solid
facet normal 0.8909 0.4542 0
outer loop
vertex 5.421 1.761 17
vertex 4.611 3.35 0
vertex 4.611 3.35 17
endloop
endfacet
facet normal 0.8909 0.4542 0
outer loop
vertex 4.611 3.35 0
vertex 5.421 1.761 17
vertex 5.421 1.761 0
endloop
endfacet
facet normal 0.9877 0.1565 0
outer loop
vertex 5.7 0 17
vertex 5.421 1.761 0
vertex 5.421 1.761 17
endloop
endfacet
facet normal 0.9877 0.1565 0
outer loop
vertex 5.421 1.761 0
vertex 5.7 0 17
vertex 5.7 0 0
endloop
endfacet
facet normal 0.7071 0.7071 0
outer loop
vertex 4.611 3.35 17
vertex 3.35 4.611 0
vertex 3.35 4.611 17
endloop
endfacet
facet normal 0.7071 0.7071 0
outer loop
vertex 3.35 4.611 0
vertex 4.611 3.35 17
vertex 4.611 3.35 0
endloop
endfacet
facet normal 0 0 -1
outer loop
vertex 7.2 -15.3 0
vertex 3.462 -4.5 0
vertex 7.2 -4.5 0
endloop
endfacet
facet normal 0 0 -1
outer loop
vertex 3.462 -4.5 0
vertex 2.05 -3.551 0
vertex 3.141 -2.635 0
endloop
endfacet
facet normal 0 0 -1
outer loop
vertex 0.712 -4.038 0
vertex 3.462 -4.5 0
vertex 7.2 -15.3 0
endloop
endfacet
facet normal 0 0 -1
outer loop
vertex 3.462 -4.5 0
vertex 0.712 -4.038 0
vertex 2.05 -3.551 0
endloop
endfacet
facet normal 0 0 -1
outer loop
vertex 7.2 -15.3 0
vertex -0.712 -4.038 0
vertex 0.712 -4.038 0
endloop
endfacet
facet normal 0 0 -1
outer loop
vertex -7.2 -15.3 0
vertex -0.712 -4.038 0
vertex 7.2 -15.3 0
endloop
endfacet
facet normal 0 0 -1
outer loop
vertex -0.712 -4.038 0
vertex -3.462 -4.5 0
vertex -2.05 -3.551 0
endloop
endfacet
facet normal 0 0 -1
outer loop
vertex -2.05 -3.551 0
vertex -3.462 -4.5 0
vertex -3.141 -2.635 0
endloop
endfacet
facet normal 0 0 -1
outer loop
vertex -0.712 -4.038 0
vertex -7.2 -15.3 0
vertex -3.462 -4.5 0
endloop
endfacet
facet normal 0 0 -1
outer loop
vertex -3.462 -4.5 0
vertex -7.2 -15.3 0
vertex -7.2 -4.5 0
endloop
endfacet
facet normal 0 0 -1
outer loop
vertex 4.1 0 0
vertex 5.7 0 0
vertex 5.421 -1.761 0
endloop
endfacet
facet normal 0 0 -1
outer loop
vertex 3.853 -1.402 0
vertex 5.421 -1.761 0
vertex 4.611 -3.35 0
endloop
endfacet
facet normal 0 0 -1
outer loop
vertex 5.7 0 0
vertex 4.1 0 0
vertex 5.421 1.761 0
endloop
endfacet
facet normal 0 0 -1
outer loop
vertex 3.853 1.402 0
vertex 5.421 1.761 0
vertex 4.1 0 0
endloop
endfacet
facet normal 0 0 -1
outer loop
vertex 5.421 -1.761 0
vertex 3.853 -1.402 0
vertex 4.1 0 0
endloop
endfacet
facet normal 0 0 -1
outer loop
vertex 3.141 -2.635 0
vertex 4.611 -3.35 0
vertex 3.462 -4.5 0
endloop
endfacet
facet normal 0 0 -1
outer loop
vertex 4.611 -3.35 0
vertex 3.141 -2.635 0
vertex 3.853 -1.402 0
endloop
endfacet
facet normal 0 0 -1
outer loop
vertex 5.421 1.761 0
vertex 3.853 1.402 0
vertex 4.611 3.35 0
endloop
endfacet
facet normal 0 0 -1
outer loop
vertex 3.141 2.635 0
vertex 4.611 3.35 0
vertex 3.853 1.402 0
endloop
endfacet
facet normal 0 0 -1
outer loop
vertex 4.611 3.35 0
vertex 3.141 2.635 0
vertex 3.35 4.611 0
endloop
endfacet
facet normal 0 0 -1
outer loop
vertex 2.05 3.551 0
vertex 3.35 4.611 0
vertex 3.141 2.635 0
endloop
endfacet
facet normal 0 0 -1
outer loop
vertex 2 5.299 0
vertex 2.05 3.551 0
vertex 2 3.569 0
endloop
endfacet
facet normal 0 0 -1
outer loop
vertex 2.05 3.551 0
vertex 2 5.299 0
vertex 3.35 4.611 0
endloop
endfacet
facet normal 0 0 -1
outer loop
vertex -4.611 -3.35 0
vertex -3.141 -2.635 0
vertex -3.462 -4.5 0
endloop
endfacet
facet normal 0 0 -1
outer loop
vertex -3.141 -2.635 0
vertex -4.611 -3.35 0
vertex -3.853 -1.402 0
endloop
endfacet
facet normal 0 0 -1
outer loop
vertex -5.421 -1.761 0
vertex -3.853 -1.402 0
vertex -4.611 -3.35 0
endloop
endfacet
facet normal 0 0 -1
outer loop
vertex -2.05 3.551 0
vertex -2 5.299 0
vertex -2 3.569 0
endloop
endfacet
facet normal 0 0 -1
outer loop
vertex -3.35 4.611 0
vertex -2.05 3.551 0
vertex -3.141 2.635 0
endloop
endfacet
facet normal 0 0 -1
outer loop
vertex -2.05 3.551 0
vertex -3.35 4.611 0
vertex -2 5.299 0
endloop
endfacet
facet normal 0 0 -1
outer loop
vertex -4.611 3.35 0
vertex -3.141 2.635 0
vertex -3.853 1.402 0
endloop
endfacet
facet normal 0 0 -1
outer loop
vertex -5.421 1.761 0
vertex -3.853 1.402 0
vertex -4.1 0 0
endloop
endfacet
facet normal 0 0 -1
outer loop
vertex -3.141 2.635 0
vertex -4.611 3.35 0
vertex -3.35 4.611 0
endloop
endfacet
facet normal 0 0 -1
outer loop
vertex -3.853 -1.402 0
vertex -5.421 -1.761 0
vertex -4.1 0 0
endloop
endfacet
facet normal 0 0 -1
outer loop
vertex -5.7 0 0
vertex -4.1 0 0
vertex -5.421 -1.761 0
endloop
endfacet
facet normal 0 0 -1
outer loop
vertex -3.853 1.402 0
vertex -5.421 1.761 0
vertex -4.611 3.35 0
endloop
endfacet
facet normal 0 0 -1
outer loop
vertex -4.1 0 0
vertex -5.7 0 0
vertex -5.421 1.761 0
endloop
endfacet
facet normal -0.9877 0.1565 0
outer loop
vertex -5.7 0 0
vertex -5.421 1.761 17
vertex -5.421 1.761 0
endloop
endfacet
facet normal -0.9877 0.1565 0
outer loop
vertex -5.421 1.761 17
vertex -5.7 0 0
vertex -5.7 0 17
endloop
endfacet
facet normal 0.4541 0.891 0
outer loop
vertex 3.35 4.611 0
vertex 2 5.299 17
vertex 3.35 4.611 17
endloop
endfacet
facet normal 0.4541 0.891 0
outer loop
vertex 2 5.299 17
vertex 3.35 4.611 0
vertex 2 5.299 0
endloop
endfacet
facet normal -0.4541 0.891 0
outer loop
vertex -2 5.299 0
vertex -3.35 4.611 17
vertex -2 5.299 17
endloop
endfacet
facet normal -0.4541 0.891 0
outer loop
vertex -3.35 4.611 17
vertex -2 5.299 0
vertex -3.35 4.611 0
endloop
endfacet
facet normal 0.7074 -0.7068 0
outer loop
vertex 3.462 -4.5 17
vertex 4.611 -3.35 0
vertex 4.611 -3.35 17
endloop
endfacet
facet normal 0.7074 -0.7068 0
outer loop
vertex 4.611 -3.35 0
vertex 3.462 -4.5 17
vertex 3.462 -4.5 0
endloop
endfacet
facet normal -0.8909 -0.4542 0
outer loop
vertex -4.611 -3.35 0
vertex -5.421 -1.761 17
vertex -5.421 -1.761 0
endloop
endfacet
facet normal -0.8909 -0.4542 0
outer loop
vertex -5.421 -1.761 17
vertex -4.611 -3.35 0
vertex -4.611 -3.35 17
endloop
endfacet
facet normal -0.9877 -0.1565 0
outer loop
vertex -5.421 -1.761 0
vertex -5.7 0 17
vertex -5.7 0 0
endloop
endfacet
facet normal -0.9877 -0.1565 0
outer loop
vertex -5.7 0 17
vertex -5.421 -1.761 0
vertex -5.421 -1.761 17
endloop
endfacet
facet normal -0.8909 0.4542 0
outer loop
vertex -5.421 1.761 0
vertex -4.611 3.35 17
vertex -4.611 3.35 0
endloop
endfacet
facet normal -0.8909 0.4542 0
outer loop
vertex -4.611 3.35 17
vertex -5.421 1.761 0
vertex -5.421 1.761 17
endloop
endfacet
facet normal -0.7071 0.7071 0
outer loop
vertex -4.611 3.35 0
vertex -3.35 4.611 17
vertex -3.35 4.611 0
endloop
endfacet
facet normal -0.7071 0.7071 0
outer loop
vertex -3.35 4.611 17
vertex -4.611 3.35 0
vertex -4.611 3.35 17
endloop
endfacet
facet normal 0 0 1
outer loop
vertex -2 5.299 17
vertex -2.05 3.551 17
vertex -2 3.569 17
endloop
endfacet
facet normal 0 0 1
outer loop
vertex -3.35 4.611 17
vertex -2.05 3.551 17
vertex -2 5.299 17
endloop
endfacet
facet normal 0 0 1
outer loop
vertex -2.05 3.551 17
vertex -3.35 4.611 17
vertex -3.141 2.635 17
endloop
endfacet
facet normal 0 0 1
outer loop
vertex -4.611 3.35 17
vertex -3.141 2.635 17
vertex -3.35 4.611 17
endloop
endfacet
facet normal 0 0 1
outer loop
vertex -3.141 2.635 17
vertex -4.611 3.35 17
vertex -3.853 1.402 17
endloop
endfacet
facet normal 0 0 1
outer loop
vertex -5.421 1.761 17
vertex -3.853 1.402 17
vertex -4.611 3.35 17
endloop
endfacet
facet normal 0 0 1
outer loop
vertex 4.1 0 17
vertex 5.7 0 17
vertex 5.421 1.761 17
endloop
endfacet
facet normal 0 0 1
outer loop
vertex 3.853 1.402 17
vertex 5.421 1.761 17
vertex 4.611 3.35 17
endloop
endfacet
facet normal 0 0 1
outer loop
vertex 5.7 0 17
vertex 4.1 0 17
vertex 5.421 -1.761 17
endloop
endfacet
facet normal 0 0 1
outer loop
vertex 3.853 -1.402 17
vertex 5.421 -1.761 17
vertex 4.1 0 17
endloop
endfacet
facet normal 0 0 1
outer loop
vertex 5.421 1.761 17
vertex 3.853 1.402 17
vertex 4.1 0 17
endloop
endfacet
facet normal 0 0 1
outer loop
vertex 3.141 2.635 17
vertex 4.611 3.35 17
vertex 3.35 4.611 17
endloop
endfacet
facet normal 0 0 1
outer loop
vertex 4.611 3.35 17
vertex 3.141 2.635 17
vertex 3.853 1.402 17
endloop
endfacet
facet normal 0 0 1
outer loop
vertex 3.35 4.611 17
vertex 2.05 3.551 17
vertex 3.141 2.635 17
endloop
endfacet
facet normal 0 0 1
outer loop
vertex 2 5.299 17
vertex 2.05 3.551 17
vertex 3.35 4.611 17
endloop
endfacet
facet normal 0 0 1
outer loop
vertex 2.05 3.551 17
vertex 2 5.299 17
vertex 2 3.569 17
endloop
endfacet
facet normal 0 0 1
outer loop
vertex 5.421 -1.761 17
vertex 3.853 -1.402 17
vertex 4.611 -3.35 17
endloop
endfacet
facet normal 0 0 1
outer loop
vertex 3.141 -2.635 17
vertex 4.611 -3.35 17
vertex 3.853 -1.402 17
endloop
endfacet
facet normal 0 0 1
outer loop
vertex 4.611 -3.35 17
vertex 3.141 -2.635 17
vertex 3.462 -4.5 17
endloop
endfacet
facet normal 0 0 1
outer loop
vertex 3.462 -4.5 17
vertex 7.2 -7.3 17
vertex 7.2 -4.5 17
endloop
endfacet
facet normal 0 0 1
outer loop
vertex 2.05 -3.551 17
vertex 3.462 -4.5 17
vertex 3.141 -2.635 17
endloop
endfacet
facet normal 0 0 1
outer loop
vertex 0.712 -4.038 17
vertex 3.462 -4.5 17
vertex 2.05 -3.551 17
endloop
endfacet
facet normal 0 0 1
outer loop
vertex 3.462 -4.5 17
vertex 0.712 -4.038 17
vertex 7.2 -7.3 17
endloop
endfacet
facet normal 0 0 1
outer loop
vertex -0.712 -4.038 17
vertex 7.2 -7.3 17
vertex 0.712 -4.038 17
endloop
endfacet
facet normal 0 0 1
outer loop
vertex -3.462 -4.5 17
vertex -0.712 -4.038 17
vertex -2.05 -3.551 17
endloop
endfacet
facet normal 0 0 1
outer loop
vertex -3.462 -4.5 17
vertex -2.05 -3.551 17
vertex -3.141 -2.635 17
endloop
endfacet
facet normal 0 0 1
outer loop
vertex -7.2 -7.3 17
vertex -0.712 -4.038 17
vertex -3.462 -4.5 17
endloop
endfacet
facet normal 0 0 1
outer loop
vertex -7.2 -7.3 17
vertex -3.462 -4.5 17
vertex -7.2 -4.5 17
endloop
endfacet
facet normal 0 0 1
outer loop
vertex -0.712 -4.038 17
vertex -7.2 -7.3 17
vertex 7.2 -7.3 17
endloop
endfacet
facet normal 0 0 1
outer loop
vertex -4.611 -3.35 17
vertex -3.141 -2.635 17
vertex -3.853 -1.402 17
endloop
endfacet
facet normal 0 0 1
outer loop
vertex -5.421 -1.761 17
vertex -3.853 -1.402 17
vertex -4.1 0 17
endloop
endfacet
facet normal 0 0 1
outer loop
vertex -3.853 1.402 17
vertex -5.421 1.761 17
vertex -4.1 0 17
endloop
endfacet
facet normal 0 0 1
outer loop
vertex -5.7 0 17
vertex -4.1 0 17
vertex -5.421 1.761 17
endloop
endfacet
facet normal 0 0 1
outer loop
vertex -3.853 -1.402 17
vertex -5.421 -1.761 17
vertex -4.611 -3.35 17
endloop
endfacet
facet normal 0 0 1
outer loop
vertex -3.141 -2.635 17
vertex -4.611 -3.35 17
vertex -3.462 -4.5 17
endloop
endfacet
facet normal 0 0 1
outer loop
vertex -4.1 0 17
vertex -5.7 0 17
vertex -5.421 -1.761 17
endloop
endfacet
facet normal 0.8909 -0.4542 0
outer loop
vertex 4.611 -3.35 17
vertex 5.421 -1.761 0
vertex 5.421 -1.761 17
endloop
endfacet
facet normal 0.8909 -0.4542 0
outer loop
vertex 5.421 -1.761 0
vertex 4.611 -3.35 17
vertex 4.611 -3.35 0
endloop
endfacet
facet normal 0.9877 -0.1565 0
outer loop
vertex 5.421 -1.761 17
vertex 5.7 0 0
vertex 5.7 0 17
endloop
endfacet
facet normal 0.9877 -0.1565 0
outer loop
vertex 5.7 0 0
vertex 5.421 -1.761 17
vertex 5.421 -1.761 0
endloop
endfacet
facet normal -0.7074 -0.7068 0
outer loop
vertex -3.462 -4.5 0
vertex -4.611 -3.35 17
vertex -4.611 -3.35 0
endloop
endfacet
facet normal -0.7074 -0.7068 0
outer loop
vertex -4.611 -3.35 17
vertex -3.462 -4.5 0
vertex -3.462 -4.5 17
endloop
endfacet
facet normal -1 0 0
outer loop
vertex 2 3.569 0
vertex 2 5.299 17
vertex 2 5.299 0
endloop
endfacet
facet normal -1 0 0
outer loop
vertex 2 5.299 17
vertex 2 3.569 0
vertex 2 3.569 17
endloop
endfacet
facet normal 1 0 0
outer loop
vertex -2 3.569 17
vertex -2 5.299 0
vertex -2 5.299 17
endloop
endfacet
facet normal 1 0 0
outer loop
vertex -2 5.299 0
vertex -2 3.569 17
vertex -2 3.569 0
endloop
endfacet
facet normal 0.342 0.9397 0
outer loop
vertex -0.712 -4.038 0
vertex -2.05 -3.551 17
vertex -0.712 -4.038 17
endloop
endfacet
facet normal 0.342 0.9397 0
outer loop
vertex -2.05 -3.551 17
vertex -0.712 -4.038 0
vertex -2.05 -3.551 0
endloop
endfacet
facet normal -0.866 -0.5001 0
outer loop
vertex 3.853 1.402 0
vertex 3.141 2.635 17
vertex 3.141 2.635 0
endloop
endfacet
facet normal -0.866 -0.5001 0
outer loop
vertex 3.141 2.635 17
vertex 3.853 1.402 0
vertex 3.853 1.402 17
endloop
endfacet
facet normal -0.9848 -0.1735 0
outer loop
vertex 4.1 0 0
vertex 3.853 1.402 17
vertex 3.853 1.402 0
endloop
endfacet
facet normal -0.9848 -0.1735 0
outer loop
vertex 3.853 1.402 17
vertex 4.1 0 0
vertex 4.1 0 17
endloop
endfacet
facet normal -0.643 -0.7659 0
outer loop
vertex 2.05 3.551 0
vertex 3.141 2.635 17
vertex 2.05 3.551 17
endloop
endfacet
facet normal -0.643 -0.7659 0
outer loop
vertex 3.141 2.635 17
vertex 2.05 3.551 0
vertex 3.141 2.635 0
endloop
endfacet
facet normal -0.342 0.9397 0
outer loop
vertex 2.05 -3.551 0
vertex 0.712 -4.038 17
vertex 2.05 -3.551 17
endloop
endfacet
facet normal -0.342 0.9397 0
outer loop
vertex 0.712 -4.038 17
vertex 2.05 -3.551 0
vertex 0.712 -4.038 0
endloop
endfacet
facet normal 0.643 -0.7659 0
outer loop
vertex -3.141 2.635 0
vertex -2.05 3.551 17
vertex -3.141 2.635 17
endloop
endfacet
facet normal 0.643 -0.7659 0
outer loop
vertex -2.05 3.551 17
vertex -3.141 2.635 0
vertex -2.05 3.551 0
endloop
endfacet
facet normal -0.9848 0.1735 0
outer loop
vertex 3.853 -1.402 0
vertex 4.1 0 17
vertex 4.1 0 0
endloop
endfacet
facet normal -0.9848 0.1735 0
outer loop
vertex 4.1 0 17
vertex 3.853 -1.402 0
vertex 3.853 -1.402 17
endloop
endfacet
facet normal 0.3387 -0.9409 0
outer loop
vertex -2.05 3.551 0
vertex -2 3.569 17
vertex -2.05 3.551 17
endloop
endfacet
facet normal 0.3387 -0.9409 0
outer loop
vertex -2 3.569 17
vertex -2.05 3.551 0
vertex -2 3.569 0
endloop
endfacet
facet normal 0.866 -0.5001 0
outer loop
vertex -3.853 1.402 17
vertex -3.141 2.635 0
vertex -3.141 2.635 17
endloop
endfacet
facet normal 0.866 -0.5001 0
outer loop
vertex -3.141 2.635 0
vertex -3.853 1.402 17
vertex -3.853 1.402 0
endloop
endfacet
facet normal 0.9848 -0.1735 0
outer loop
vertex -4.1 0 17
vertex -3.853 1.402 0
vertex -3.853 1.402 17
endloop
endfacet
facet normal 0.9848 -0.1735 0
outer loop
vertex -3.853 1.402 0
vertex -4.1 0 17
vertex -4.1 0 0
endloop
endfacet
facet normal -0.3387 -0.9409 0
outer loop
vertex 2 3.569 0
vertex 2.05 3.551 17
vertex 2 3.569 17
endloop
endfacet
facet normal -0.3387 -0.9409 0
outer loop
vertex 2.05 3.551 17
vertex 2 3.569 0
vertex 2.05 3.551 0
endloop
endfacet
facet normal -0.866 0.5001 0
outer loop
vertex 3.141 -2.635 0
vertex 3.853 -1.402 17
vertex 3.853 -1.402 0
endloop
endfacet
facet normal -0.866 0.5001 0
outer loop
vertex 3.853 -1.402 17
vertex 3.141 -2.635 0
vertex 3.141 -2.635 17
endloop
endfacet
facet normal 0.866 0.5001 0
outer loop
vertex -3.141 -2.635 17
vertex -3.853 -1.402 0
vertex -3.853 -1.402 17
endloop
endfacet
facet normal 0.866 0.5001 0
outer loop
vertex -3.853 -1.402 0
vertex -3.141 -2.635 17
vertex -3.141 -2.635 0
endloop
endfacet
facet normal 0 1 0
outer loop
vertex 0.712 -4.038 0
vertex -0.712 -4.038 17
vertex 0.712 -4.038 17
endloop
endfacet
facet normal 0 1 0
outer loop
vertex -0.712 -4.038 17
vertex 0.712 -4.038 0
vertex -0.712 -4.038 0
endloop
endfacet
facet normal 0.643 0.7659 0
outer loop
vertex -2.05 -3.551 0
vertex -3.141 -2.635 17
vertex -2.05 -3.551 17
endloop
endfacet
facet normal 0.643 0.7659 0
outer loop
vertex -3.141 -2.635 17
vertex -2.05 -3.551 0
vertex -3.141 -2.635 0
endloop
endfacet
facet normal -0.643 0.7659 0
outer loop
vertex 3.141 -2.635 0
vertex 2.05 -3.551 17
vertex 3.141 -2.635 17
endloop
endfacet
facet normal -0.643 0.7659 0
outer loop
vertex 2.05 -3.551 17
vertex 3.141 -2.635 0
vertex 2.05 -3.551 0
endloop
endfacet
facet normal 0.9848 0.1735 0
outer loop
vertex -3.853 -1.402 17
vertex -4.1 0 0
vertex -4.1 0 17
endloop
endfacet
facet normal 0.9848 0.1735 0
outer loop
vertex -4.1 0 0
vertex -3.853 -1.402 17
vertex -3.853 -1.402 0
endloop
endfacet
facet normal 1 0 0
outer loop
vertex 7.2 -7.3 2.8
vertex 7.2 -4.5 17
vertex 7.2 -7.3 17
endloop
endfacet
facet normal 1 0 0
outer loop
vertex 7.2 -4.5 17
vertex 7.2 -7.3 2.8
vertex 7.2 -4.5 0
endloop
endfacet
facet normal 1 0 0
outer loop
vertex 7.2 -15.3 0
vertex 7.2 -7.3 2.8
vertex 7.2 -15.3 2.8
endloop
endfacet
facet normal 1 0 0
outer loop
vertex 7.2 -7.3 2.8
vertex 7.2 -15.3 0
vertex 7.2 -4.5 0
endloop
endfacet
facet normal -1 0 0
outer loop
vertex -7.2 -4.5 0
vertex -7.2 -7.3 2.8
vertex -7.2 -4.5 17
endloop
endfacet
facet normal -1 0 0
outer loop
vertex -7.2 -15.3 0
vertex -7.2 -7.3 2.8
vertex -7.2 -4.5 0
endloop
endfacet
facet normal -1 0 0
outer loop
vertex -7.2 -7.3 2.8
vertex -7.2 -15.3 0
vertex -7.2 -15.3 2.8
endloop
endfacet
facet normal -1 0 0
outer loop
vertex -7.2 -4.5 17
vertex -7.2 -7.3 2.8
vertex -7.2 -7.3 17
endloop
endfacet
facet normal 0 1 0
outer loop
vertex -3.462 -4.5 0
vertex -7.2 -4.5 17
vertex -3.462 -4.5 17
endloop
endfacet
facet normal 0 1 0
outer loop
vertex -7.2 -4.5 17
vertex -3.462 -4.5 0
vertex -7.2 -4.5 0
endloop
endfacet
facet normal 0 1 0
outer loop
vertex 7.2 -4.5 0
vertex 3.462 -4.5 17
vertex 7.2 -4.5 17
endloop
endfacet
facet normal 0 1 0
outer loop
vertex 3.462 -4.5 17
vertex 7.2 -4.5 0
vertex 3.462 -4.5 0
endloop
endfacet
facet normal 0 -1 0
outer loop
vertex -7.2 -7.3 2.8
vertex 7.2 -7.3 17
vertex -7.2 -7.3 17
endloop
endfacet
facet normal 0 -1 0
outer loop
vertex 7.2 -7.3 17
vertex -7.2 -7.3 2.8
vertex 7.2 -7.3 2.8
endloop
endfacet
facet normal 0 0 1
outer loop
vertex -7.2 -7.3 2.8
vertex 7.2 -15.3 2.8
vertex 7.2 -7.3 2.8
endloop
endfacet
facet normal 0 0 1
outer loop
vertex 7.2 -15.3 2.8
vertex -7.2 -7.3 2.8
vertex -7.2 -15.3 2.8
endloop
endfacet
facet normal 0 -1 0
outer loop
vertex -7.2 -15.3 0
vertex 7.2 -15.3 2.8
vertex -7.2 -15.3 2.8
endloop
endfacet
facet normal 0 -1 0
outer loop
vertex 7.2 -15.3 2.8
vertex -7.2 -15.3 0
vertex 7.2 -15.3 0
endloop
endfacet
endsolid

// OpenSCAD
Openning_Width = 4;
Wall_Thickness = 3.2;
Cable_Diameter = 8.2; 
Side_Thickness = 2.8;
Height = 17;
Side_Width = 8;
Extra_Width = 3;
Cylinder_Quality = 20;

difference(){
cylinder(d=Cable_Diameter+Wall_Thickness,h=Height,$fn=Cylinder_Quality);
translate([-Openning_Width/2,0,-.5])
cube([Openning_Width,Cable_Diameter+Wall_Thickness,Height*3]);
cylinder(d=Cable_Diameter,h=Height*3,center=true,$fn=Cylinder_Quality*0.9);
}
translate([-(Cable_Diameter+Wall_Thickness+Extra_Width)/2,-Side_Thickness-Cable_Diameter/2-Wall_Thickness/8])
cube([Cable_Diameter+Wall_Thickness+Extra_Width,Side_Thickness,Height]);

translate([-(Cable_Diameter+Wall_Thickness+Extra_Width)/2,-Side_Width-Side_Thickness-Cable_Diameter/2-Wall_Thickness/8])
cube([Cable_Diameter+Wall_Thickness+Extra_Width,Side_Width+Side_Thickness,Side_Thickness]);
